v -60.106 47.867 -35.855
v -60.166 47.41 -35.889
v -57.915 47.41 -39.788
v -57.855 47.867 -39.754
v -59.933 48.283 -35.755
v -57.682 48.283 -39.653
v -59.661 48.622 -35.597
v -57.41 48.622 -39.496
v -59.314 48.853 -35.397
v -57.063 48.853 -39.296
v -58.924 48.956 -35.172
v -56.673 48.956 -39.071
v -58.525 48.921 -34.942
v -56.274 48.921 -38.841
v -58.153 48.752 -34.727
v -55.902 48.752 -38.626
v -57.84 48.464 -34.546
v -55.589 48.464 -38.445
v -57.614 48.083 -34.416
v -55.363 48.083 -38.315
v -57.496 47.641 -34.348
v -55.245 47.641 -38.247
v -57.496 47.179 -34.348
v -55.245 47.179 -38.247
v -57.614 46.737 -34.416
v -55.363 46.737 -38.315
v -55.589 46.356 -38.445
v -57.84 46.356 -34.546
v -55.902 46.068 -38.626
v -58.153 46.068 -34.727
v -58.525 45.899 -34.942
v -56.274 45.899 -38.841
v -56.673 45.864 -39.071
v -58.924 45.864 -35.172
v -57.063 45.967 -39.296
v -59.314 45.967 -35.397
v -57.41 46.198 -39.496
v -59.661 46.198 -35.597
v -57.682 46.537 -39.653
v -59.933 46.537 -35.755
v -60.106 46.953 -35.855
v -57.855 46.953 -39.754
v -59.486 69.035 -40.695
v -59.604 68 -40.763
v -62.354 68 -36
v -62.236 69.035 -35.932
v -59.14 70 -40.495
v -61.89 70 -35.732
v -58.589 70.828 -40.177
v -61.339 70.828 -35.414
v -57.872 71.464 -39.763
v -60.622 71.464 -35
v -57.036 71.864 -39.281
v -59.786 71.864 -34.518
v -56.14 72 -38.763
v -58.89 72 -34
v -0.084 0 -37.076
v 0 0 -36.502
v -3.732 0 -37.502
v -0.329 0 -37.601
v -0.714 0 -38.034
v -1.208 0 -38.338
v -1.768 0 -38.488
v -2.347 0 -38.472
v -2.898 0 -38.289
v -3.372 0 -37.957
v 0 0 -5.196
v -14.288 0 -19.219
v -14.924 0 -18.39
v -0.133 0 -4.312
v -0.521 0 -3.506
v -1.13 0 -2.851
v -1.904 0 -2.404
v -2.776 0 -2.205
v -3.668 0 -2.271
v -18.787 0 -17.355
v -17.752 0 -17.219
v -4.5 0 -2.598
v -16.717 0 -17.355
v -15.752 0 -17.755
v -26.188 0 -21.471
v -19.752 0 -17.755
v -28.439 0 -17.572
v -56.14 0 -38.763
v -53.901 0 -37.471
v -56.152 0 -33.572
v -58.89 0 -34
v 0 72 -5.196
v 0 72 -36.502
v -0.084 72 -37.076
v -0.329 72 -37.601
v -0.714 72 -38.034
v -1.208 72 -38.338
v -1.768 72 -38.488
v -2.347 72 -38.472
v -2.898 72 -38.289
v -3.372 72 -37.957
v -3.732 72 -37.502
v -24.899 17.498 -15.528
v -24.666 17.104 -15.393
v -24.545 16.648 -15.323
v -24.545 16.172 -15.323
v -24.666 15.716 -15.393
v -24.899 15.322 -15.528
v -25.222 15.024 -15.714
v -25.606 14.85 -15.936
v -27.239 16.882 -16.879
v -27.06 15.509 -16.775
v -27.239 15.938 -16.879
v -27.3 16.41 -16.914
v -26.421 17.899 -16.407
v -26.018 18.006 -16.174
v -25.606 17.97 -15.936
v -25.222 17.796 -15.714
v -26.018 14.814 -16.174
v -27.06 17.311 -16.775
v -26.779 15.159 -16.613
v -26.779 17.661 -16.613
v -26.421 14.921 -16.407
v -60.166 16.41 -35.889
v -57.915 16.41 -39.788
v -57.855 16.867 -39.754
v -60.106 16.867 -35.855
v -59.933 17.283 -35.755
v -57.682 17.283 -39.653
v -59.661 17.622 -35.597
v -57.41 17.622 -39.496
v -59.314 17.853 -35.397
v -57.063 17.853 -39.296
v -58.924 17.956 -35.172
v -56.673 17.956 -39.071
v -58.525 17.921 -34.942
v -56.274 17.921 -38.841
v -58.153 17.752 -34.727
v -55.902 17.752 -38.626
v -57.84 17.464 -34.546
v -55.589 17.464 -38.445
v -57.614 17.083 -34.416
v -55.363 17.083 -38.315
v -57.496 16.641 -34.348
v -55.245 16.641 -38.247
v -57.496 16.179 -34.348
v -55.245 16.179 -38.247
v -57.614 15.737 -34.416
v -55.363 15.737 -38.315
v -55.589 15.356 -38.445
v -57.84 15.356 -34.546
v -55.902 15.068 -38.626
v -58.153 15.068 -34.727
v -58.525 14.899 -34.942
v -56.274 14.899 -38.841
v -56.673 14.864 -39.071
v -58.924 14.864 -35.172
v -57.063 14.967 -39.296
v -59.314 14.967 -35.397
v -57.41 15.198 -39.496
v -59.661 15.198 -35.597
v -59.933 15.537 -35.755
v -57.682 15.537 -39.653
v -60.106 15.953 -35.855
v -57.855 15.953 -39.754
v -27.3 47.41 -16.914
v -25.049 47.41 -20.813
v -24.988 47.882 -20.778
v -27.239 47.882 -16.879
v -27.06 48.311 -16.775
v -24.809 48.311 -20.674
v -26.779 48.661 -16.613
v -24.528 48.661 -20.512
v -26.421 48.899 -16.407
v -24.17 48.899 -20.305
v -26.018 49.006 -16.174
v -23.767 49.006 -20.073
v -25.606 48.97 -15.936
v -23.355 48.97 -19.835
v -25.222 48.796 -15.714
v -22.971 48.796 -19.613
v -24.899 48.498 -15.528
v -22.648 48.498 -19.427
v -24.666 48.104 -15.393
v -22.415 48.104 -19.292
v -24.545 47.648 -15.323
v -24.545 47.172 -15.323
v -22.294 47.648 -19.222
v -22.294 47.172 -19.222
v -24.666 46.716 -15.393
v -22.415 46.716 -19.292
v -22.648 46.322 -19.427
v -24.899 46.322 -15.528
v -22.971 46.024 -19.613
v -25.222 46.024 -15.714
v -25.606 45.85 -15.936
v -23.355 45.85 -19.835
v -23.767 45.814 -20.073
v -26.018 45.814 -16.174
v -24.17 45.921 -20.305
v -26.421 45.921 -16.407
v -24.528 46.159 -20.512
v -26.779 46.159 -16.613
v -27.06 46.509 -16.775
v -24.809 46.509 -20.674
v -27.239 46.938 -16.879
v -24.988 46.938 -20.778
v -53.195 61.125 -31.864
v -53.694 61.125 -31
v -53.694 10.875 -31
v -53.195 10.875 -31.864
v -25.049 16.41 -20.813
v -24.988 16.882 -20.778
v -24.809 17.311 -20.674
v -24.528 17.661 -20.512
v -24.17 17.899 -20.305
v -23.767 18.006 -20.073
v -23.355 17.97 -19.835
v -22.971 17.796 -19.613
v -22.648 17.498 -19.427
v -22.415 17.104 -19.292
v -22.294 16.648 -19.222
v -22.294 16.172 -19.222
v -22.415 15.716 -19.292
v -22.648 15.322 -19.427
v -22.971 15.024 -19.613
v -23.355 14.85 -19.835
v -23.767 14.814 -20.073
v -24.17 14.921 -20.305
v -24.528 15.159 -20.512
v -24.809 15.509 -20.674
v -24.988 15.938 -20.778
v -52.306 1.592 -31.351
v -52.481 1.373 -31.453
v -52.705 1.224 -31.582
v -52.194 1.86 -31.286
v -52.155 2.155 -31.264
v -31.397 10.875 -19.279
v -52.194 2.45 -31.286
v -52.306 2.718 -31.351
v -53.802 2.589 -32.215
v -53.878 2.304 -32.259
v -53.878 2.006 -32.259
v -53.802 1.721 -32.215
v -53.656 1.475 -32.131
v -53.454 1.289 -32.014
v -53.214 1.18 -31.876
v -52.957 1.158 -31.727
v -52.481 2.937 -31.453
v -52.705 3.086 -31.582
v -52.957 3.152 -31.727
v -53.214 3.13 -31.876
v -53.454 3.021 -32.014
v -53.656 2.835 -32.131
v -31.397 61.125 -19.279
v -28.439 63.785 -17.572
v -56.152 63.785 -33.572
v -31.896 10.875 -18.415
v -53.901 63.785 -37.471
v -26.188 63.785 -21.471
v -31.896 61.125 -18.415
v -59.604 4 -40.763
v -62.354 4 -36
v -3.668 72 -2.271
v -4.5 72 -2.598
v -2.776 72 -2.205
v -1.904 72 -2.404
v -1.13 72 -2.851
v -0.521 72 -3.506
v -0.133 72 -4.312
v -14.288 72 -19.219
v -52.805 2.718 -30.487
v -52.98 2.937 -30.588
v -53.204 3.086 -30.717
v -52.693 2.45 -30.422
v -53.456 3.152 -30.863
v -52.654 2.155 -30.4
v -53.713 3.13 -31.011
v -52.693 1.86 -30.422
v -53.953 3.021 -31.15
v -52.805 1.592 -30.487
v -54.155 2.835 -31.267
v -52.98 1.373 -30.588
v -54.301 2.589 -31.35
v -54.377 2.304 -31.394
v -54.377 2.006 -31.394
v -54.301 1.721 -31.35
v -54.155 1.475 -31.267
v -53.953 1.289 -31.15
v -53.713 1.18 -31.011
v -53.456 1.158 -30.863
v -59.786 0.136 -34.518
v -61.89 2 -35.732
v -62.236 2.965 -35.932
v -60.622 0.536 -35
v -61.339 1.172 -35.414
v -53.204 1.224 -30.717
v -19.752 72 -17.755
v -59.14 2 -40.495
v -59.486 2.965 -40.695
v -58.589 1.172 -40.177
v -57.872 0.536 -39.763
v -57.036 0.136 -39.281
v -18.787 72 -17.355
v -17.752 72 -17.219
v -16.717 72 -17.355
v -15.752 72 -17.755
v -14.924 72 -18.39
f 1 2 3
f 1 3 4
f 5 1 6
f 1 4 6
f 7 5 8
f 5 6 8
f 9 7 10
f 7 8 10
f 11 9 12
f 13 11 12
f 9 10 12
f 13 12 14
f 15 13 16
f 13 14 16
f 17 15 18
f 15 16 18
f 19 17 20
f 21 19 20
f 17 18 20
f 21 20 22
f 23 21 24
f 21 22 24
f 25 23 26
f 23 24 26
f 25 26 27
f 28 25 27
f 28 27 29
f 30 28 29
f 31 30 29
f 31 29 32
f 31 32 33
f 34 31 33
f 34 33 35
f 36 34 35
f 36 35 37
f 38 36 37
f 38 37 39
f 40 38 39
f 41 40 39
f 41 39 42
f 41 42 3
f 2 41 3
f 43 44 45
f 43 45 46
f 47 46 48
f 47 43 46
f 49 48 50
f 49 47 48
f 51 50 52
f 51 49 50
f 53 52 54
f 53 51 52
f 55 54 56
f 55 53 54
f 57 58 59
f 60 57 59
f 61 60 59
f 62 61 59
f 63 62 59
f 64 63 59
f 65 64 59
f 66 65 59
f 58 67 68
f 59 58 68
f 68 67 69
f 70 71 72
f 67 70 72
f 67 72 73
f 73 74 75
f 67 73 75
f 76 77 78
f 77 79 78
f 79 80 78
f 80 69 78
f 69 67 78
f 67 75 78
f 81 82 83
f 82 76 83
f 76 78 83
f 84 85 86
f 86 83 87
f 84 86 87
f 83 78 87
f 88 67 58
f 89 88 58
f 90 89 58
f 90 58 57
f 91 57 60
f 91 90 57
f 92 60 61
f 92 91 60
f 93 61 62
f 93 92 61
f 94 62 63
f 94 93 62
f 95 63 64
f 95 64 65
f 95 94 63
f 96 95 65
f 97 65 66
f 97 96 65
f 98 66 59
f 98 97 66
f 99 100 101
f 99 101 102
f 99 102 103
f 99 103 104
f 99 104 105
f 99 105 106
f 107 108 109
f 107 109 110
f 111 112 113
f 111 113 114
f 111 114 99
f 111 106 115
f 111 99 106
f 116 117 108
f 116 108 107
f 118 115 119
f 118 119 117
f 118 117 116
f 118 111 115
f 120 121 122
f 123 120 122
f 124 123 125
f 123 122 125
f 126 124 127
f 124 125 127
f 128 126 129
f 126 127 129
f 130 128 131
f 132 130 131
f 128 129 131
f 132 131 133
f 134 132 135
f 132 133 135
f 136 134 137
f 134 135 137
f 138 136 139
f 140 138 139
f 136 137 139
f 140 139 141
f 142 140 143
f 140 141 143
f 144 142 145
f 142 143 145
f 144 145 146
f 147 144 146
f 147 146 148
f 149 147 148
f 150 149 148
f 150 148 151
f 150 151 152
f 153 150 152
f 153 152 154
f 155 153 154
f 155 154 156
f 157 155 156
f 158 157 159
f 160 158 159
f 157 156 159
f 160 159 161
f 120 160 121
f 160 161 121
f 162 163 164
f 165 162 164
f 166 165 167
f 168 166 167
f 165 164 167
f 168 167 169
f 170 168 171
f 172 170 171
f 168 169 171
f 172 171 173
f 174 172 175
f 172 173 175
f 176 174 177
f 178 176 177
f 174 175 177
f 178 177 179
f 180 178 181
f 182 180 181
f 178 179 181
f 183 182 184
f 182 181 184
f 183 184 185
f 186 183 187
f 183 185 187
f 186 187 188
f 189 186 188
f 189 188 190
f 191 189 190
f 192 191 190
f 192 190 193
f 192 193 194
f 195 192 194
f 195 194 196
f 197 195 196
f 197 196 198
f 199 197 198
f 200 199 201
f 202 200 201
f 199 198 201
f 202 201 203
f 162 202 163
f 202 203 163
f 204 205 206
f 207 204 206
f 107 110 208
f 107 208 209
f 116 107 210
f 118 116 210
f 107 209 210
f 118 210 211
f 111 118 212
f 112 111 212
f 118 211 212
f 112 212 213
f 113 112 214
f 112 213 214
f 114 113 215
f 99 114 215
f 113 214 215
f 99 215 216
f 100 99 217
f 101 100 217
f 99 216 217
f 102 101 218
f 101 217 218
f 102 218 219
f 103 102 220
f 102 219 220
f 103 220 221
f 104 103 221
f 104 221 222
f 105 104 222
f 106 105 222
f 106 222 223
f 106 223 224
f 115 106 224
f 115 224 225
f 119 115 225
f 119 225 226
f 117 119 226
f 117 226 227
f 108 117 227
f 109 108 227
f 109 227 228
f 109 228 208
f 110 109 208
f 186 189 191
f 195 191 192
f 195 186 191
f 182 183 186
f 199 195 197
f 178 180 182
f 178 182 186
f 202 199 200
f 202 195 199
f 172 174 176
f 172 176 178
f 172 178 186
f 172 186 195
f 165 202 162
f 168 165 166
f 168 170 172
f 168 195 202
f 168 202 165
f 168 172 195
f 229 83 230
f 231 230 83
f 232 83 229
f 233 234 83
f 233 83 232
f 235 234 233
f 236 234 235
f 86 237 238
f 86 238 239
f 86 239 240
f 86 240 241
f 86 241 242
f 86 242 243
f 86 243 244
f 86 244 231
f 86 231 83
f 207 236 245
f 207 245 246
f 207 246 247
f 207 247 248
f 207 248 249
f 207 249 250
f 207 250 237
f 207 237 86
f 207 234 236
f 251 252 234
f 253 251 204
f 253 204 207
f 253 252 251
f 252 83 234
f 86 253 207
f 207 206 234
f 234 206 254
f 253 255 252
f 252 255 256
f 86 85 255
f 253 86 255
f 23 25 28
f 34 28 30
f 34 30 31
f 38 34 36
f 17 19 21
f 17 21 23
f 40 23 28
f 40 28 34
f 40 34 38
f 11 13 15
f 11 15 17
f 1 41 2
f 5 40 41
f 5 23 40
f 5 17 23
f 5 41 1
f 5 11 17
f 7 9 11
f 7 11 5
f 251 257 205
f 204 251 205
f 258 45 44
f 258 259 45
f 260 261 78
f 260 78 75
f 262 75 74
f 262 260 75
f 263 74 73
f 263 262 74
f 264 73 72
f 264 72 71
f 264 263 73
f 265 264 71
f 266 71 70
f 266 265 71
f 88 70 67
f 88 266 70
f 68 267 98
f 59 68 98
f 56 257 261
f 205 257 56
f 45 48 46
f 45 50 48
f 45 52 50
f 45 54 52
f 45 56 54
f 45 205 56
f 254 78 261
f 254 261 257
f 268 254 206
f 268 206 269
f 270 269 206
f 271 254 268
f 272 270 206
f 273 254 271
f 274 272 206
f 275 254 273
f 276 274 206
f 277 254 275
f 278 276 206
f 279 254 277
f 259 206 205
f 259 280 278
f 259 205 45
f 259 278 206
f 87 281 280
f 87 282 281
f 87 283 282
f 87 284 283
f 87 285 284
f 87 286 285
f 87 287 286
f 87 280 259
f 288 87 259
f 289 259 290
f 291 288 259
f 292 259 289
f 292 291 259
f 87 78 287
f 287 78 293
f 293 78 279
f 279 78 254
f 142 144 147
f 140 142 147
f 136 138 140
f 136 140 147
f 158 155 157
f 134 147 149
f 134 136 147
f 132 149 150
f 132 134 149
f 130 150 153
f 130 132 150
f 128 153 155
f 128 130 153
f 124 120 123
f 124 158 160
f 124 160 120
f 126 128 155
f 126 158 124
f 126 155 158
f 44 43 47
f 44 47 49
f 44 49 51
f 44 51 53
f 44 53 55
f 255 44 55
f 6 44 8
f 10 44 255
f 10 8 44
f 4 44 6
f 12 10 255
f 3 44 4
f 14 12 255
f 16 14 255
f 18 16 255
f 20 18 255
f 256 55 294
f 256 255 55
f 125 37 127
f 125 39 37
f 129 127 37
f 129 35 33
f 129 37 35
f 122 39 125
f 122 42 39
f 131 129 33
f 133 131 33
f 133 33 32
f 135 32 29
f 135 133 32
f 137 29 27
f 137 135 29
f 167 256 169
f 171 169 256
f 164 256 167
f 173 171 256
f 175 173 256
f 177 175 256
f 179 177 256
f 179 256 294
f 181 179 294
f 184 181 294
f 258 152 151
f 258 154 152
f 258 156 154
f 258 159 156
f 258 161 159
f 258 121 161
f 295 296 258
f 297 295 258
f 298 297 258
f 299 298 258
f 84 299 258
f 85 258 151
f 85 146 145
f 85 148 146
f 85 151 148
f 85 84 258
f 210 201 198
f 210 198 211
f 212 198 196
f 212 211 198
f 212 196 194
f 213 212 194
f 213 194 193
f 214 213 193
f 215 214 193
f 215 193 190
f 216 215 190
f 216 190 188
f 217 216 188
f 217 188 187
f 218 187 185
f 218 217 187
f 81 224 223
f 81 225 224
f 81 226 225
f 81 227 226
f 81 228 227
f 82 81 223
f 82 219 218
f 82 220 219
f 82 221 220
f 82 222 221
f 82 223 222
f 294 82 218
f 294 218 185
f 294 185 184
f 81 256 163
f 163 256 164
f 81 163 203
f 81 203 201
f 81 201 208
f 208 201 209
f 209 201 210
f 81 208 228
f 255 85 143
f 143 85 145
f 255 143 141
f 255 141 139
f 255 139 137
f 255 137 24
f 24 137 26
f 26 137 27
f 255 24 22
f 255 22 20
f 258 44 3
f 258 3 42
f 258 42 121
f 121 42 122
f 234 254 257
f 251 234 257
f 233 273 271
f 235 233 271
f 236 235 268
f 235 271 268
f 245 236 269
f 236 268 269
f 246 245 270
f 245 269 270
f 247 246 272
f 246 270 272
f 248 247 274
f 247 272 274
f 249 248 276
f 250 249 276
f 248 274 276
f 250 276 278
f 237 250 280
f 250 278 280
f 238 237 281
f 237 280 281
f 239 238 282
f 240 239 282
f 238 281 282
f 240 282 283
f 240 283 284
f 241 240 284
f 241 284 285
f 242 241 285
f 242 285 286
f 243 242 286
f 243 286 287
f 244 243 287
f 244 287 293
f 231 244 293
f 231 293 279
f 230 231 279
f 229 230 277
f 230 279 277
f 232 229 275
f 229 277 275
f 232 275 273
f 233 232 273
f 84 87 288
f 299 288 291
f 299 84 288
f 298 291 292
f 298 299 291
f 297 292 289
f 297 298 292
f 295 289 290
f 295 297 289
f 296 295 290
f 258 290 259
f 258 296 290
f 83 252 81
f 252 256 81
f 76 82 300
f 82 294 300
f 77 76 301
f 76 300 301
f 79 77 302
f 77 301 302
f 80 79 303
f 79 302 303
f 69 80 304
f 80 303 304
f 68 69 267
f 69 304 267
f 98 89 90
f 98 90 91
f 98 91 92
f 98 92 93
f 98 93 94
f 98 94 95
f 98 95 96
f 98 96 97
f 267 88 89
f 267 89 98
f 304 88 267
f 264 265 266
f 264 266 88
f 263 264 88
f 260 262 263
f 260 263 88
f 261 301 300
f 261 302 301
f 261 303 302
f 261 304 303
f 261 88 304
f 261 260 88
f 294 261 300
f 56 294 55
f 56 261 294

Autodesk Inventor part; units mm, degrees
ref_plane "YZ Plane" through (0, 0, 0) normal (1, 0, 0) x (0, 1, 0)
ref_plane "XZ Plane" through (0, 0, 0) normal (0, 1, 0) x (-1, 0, 0)
ref_plane "XY Plane" through (0, 0, 0) normal (0, 0, 1) x (1, 0, 0)
sketch "Sketch1" plane through (0, 0, 0) normal (0, 1, 0) x (-1, 0, 0)
  line L0 (0, 0) -> (62.3538, -36)
  line L1 (0, 25) -> (0, -25) construction
  line L2 (62.3538, -36) -> (59.6038, -40.7631)
  line L3 (59.6038, -40.7631) -> (16.2879, -15.7547)
  line L4 (16.2879, -15.7547) -> (0, -43.9661)
  line L5 (0, 0) -> (0, -43.9661)
  dimension "d0" = 72
  dimension "d1" = 50
  dimension "d2" = 60
  dimension "d3" = 5.5
  dimension "d19" = 90
extrude "Extrusion1" add sketch "Sketch1" along normal blind 72
sketch "Sketch2" plane through (0, 0, 0) normal (-0.5, 0, 0.866) x (0.866, 0, 0.5)
  line L0 (-62, 10.875) -> (-36.83, 10.875)
  line L1 (-36.83, 10.875) -> (-36.83, 61.125)
  line L2 (-36.83, 61.125) -> (-62, 61.125)
  line L3 (-62, 61.125) -> (-62, 10.875)
  line L4 (-72, 0) -> (-72, 72) projected
  circle A0 centre (-61.8, 2.155) radius 1
  point P0 (0, 0)
  point P1 (-62, 36)
  point P2 (-72, 36)
  dimension "d6" = 25.17
  dimension "d7" = 50.25
  dimension "d8" = 10
  dimension "d66" = 2
  dimension "d67" = 8.72
  dimension "d68" = 0.2
extrude "Extrusion2" cut sketch "Sketch2" against normal up to surface (5.5 mm away)
sketch "Sketch3" plane through (-59.6038, 0, -40.7631) normal (0.5, 0, -0.866) x (-0.866, 0, -0.5)
  line L0 (-6.585, 63.785) -> (-38.585, 63.785)
  line L1 (-38.585, 63.785) -> (-38.585, -1.215)
  line L2 (-38.585, -1.215) -> (-6.585, -1.215)
  line L3 (-6.585, -1.215) -> (-6.585, 63.785)
  line L4 (-35.17, 61.125) -> (-10, 61.125) projected
  point P0 (-72, 0)
  point P1 (-22.585, 63.785)
  point P2 (-22.585, 61.125)
  dimension "d11" = 32
  dimension "d12" = 65
  dimension "d13" = 2.66
extrude "Extrusion3" cut sketch "Sketch3" against normal blind 4.5
fillet "Fillet1" radius 3 1 edges at (0, 36, 0)
fillet "Fillet2" radius 2 1 edges at (0, 36, -43.9661)
fillet "Fillet3" radius 4 2 edges at (-60.9788, 72, -38.3816) (-60.9788, 0, -38.3816)
fillet "Fillet4" radius 4 1 edges at (-16.2879, 36, -15.7547)
sketch "Sketch4" plane through (-26.1882, 0, -21.4706) normal (0.5, 0, -0.866) x (-0.866, 0, -0.5)
  circle A0 centre (35.085, 16.41) radius 1.55
  line L0 (38.585, 4) -> (38.585, 68) projected
  circle A1 centre (35.085, 47.41) radius 1.55
  circle A2 centre (-2.915, 16.41) radius 1.6
  circle A3 centre (-2.915, 47.41) radius 1.6
  point P0 (-33.415, 0)
  point P1 (34.585, 0)
  dimension "d21" = 3.1
  dimension "d22" = 16.41
  dimension "d23" = 3.5
  dimension "d24" = 3.1
  dimension "d25" = 31
  dimension "d26" = 3.2
  dimension "d27" = 38
  dimension "d28" = 3.2
  dimension "d29" = 38
extrude "Extrusion4" cut sketch "Sketch4" against normal up to surface (4.5 mm away)
sketch "Sketch5" plane through (0, 0, 0) normal (0, -1, 0) x (1, 0, 0)
  line L0 (-11.1256, -19.2586) -> (-11.1256, -9.2074) construction
  line L1 (-11.1256, -9.2074) -> (-1.0319, -9.2074) construction
  line L2 (-1.0319, -9.2074) -> (-1.0319, -19.2586) construction
  line L3 (-1.0319, -19.2586) -> (-11.1256, -19.2586) construction
  arc A0 (-8.7423, -17.7336) -> (-8.7372, -10.7469) centre (-6.0502, -14.2422) ccw
  arc A1 (-9.1232, -18.214) -> (-9.1477, -10.2896) centre (-6.0502, -14.2422) ccw
  arc A2 (-9.1477, -10.2896) -> (-8.7372, -10.7469) centre (-8.8163, -10.405) ccw
  arc A3 (-8.7423, -17.7336) -> (-9.1232, -18.214) centre (-8.8713, -18.0225) ccw
  line L4 (-4.6557, -14.5422) -> (-7.2177, -14.5422)
  line L5 (-7.2177, -14.5422) -> (-7.2177, -13.9533)
  line L6 (-7.2177, -13.9533) -> (-4.6557, -13.9533)
  line L7 (-4.6557, -13.9533) -> (-4.6557, -14.5422)
  arc A4 (-4.6557, -14.5422) -> (-4.6557, -13.9533) centre (-4.7199, -14.2478) ccw
  arc A5 (-7.2177, -13.9533) -> (-7.2177, -14.5422) centre (-7.171, -14.2478) ccw
  arc A6 (-8.2247, -12.6322) -> (-8.1705, -15.9511) centre (-6.0663, -14.2568) ccw
  arc A7 (-7.7175, -12.932) -> (-7.6745, -15.6001) centre (-6.057, -14.2396) ccw
  arc A8 (-8.6126, -12.2607) -> (-8.5782, -16.3059) centre (-6.0095, -14.2613) ccw
  arc A9 (-9.1192, -11.9337) -> (-9.0775, -16.6329) centre (-6.1136, -14.2568) ccw
  arc A10 (-9.5852, -11.4861) -> (-9.568, -17.0116) centre (-5.9362, -14.2375) ccw
  point P0 (0, 0)
properties part number "ShelfLabelStand"
